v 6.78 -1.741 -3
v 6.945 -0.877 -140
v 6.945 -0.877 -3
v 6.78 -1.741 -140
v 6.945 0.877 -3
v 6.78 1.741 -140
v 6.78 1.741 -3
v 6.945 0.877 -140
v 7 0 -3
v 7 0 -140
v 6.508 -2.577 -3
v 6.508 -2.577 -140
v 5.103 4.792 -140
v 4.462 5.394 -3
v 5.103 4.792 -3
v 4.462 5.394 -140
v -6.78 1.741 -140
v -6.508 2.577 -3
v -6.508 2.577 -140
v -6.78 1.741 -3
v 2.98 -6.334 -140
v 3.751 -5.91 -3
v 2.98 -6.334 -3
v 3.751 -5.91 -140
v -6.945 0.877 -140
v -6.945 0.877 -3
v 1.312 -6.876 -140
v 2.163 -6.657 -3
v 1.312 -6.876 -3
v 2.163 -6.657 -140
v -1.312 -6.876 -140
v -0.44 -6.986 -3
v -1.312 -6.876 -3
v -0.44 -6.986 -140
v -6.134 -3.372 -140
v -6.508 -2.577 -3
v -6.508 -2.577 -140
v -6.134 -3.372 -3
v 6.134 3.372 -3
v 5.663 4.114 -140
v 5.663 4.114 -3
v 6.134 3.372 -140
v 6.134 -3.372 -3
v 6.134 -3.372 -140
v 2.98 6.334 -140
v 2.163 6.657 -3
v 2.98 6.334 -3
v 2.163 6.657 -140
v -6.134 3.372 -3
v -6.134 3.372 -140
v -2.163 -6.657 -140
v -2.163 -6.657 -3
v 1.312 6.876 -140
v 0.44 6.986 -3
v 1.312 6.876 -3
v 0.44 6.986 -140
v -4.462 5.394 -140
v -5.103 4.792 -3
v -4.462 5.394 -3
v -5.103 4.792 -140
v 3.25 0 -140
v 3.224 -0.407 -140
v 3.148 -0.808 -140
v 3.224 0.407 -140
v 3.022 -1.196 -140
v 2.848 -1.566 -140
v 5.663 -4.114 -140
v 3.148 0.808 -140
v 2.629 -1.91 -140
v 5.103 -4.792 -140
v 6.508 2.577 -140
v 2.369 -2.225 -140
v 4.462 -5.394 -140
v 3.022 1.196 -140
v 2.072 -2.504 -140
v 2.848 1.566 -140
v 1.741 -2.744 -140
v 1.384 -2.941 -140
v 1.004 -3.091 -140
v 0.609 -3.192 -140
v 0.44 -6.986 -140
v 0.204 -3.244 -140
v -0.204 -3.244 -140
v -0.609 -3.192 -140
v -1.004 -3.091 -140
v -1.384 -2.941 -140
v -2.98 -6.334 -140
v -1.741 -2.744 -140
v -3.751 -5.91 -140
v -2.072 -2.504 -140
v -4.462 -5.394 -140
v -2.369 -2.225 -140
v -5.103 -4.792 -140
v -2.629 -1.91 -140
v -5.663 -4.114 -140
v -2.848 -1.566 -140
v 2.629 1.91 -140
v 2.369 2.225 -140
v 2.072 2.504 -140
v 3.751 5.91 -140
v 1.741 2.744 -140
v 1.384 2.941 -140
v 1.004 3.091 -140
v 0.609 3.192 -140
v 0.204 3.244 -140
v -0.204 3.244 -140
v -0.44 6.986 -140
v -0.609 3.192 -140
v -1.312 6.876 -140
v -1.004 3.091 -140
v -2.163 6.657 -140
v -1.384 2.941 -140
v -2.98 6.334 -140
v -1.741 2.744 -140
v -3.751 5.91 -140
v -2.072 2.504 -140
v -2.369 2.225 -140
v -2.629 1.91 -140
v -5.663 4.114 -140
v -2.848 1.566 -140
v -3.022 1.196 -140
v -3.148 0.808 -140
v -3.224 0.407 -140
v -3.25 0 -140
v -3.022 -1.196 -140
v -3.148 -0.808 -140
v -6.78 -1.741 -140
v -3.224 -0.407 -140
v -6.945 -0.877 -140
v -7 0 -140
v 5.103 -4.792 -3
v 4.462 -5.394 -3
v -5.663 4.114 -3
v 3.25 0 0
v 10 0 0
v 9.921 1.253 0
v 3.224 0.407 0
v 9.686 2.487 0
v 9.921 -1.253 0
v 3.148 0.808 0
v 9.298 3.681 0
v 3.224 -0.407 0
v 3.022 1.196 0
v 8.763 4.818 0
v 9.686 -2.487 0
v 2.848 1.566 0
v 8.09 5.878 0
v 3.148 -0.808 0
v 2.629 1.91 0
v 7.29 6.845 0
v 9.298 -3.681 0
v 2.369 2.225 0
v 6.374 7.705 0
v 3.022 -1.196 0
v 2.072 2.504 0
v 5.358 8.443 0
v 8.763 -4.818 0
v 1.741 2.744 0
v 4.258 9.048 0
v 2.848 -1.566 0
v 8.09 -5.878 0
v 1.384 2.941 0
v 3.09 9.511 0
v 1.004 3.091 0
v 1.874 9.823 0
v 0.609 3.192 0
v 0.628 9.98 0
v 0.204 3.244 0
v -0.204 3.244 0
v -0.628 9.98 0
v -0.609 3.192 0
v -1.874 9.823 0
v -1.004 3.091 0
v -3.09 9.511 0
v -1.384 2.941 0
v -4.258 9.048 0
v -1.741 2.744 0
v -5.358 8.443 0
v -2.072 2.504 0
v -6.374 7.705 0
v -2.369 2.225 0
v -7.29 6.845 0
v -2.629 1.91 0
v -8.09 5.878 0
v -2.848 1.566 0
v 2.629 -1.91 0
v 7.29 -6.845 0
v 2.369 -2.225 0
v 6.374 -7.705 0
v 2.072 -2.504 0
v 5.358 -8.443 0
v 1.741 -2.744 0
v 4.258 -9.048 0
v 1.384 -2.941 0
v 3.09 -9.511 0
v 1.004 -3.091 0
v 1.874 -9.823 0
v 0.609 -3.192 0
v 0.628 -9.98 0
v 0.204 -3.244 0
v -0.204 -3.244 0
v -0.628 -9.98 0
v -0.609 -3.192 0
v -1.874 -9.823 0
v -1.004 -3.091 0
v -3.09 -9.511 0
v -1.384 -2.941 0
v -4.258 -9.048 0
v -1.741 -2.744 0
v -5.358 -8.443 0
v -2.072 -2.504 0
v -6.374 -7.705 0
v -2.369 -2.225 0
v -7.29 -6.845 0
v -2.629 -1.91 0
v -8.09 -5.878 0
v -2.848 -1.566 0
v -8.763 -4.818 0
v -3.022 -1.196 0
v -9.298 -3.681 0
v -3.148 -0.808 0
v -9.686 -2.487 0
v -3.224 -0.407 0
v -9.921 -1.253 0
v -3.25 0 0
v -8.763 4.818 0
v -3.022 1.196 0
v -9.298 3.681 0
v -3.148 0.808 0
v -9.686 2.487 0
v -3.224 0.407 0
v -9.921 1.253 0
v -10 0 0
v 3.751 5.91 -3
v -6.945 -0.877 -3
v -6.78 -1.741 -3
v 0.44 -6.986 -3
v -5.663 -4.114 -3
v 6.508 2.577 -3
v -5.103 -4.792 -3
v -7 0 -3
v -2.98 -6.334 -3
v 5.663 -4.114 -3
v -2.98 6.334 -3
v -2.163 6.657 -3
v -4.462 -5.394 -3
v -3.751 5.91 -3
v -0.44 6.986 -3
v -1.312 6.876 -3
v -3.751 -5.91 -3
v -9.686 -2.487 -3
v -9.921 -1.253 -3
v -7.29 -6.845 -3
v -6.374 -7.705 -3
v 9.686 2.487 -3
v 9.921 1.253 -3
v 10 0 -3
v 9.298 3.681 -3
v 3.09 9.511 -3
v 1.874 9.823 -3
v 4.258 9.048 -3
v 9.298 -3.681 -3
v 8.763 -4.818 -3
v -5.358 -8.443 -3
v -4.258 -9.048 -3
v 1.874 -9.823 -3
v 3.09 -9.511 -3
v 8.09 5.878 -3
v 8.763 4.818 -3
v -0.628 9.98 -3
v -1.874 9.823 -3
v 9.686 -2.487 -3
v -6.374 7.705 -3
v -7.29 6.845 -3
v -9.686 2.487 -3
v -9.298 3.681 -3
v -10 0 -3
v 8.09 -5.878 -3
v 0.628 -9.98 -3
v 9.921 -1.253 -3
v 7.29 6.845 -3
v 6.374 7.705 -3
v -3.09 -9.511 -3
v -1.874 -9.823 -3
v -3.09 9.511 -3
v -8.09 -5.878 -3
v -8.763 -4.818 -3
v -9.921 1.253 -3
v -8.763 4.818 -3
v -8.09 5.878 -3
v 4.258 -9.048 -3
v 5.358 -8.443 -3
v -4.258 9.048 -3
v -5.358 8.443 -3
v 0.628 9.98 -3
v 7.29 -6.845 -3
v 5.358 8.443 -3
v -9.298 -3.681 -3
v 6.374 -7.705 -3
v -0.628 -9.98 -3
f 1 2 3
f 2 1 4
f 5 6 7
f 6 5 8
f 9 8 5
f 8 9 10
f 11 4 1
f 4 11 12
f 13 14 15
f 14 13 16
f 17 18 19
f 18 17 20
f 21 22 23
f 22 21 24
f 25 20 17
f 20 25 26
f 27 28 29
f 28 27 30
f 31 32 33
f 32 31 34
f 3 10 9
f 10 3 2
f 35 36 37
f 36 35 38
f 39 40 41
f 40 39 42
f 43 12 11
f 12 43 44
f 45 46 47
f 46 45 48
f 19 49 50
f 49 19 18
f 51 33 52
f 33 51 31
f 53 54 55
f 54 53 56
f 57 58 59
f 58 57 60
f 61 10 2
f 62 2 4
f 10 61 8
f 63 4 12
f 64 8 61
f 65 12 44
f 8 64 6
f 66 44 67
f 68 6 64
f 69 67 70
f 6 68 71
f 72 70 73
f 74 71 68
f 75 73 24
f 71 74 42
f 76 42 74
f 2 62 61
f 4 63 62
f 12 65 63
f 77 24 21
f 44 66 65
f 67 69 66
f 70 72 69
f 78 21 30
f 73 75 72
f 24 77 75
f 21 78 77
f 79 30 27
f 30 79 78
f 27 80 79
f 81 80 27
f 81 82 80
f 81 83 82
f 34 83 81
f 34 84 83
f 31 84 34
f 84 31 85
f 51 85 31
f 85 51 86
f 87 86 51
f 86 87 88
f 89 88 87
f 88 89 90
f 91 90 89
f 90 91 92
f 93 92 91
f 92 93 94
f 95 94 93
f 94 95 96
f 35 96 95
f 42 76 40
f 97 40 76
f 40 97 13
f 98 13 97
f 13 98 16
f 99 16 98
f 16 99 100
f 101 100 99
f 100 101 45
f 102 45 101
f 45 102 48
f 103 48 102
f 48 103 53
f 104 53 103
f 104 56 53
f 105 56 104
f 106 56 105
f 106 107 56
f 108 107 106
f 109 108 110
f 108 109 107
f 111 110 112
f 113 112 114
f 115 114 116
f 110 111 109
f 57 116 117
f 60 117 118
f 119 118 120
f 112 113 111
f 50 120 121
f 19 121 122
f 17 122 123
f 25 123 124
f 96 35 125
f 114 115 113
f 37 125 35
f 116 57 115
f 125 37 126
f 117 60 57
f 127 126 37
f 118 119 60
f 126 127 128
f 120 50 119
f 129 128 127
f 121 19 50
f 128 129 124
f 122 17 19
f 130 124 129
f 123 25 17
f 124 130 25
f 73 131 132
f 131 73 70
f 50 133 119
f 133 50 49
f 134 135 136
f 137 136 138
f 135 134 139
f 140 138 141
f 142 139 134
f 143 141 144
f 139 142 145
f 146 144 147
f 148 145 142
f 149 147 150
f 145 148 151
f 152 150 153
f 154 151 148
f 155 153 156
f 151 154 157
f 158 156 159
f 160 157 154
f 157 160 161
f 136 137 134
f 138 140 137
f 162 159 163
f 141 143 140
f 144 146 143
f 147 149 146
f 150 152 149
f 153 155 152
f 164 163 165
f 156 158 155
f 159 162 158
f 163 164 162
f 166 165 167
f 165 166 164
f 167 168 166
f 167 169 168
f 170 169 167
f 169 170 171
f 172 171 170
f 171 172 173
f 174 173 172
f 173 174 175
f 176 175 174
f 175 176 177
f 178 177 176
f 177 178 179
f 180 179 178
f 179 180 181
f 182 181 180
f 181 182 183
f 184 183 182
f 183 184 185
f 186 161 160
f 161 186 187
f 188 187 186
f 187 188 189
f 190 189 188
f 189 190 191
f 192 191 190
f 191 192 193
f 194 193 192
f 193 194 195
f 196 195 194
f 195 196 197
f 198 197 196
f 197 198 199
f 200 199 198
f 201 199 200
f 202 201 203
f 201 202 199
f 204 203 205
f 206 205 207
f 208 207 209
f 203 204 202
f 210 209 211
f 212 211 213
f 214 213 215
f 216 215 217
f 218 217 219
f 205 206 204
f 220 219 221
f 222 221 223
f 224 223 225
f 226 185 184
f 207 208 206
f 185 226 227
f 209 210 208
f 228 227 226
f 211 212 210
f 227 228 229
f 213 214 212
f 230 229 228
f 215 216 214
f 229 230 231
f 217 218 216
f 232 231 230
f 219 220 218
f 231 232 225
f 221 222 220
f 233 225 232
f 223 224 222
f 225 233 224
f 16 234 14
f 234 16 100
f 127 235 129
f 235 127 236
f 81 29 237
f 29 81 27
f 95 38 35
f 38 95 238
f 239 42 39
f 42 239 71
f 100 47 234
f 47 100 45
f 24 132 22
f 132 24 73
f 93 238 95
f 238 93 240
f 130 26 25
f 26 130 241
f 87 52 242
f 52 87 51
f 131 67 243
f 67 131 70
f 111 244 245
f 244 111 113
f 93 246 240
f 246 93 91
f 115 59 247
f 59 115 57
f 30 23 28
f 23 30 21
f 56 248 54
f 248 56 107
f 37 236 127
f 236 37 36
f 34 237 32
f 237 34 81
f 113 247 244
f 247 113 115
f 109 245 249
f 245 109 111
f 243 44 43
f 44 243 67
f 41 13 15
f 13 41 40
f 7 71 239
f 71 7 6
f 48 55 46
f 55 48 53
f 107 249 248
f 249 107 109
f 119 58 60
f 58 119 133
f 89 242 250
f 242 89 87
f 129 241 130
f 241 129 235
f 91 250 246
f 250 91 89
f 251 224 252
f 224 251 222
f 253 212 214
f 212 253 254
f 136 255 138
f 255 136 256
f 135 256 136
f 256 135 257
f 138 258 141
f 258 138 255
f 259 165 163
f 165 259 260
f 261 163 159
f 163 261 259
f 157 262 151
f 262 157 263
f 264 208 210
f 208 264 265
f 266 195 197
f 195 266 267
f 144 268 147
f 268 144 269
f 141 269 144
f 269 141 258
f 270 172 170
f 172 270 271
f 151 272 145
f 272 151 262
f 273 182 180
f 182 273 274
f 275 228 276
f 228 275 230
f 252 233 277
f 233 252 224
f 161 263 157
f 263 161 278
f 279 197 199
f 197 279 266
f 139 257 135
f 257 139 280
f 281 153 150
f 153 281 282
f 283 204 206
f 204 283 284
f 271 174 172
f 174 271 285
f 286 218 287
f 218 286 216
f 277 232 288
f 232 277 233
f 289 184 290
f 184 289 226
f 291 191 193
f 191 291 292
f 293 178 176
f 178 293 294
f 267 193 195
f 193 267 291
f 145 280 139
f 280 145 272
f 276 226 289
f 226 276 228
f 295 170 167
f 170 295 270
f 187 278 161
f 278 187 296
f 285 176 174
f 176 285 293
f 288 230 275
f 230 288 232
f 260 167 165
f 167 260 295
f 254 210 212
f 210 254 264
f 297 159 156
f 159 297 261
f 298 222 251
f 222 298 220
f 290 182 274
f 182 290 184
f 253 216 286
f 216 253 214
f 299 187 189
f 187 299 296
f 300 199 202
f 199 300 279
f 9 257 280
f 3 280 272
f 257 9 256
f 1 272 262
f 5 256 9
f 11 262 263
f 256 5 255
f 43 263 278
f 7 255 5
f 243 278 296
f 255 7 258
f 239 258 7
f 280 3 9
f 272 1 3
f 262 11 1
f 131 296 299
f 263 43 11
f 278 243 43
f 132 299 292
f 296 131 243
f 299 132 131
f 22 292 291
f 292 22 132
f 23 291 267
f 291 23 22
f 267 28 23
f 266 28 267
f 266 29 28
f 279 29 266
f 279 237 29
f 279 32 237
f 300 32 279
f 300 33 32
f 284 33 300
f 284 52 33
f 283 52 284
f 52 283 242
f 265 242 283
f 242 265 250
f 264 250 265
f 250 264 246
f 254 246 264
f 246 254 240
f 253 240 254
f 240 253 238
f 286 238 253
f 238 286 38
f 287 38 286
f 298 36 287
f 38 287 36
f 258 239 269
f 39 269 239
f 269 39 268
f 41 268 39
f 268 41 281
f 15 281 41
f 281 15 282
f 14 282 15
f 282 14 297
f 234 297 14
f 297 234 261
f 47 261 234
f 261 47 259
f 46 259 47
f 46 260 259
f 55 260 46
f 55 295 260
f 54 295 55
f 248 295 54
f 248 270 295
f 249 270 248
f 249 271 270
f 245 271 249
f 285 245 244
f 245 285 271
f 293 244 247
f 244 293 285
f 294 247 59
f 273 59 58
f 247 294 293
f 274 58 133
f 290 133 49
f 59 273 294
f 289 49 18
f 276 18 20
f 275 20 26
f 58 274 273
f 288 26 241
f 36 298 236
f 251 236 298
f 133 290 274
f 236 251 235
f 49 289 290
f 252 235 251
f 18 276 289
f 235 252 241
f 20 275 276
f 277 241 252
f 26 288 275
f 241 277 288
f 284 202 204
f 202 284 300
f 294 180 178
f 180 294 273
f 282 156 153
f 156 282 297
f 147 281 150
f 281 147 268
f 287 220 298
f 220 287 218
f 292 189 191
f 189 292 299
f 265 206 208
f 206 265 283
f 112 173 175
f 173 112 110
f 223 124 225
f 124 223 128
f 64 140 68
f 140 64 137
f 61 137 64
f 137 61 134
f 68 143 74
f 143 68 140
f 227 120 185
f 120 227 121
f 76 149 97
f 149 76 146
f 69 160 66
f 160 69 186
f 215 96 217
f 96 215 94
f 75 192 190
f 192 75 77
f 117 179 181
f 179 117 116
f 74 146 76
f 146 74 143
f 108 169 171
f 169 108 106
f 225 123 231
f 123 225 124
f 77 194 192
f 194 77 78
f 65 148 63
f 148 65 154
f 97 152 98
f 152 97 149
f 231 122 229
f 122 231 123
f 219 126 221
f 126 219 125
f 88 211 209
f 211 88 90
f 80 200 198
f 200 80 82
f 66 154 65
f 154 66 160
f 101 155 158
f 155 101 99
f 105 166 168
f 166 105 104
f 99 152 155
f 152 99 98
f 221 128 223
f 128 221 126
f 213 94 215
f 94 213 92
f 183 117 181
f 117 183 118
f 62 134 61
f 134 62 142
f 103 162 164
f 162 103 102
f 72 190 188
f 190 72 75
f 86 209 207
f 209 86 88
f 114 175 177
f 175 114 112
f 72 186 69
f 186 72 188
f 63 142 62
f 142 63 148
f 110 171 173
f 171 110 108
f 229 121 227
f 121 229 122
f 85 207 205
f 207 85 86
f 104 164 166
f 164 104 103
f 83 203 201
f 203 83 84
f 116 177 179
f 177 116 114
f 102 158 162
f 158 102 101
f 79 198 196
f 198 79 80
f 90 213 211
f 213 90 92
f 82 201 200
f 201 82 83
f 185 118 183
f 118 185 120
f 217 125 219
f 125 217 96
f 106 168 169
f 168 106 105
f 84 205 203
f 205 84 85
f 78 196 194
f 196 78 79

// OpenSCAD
$fn = 50;


difference() {
	union() {
		translate(v = [0, 0, -140.0000000000]) {
			cylinder(h = 140, r = 7.0000000000);
		}
		translate(v = [0, 0, -3.0000000000]) {
			cylinder(h = 3, r = 10.0000000000);
		}
	}
	union() {
		#translate(v = [0, 0, -140]) {
			cylinder(h = 140, r = 3.2500000000);
		}
	}
}
